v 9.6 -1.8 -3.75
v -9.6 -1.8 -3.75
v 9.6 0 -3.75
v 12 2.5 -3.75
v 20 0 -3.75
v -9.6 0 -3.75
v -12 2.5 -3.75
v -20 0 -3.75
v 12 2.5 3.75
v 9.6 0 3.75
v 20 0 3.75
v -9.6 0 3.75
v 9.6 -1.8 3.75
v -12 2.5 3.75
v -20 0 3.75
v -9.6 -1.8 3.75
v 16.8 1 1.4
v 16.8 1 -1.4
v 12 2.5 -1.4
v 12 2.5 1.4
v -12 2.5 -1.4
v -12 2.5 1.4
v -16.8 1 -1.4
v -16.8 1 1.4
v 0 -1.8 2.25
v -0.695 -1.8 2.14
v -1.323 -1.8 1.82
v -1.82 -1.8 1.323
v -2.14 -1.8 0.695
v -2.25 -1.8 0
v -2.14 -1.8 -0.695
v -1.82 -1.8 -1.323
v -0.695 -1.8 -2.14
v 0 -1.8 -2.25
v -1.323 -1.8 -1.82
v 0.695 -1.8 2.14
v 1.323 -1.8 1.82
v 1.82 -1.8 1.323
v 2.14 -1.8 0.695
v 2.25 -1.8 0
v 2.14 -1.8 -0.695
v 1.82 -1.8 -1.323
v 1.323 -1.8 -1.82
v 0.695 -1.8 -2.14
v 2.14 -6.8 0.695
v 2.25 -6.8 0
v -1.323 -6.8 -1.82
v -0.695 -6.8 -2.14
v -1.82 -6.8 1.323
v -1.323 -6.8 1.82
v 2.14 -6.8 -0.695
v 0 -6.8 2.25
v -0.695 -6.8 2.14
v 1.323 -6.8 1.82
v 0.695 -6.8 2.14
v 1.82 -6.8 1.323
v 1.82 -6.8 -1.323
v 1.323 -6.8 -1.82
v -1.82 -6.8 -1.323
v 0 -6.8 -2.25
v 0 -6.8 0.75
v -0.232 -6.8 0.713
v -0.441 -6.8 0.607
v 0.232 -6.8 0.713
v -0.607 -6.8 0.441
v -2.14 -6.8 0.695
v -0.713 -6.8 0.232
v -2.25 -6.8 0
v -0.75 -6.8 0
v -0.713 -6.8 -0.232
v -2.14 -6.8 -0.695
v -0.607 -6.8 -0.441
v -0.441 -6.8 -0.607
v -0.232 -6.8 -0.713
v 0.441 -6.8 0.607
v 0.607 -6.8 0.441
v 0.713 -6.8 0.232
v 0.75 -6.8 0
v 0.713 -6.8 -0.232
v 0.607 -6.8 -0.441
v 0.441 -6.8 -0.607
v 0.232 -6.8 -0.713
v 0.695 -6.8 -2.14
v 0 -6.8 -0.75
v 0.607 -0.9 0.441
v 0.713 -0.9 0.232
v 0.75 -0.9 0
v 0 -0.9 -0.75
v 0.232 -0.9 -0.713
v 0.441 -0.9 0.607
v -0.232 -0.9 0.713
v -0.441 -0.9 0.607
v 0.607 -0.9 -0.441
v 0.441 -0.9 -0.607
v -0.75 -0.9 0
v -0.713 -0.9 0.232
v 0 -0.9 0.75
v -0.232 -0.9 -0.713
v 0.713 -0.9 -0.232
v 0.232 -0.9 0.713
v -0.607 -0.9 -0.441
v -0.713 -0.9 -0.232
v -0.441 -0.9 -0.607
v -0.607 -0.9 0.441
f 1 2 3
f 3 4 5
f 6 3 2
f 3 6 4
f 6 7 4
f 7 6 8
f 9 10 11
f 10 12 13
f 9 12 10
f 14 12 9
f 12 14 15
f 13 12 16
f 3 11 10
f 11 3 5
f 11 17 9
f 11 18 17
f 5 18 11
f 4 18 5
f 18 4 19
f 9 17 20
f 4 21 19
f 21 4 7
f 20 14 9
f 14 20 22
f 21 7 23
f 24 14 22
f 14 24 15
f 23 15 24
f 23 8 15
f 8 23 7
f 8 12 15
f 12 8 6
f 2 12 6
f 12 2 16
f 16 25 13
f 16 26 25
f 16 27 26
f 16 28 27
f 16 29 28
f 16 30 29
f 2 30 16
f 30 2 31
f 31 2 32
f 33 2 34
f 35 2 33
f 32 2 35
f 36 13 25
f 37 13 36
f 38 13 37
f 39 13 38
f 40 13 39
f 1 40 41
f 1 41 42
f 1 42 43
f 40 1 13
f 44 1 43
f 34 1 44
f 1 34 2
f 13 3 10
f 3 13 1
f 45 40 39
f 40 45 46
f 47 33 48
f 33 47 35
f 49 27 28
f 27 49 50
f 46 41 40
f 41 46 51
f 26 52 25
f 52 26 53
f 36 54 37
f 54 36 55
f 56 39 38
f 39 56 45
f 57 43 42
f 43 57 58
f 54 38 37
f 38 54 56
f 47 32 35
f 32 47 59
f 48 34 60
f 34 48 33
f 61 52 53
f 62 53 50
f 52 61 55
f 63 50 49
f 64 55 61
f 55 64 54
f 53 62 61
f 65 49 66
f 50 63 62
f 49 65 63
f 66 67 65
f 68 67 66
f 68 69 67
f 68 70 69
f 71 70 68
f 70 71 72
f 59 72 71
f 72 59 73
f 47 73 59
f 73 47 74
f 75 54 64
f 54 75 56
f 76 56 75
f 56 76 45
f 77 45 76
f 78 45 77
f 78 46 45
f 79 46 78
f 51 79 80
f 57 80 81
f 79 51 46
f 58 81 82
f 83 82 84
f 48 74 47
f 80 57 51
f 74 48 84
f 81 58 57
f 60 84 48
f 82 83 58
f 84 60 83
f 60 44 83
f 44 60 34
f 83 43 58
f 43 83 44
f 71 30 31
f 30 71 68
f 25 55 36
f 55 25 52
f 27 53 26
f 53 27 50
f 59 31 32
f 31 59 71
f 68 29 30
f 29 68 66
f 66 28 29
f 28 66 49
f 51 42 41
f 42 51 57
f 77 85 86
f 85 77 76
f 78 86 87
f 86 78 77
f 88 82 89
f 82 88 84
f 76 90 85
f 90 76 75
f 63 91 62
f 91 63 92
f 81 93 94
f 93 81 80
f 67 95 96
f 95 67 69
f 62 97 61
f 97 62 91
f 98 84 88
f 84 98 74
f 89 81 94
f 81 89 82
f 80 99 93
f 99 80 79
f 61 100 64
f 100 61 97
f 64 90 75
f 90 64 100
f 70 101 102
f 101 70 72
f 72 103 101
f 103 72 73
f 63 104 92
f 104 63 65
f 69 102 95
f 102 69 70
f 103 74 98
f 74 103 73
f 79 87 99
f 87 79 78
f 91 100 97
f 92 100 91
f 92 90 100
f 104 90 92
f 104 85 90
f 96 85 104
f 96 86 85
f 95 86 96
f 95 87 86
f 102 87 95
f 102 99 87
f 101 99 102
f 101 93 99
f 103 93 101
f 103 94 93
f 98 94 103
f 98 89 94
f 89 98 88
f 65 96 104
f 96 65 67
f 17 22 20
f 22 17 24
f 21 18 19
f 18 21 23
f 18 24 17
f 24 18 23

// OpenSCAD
laenge = 40;
laenge1 = 24;
hoehe1 = 2.5;
laenge2 = 19.2; // or 12
hoehe2 = 1.8;
breite = 7.5;
zylinderd = 4.5;
zylinderl = 5;
schraube = 1.5;
rille = 2.8;
$fn=20;

points = [[laenge/2, 0], [laenge1/2, hoehe1], [-laenge1/2, hoehe1], [-laenge/2, 0], [-laenge2/2, 0],[-laenge2/2, -hoehe2], [laenge2/2, -hoehe2], [laenge2/2, 0]  ];

difference(){
    union(){
        linear_extrude(breite, center=true) polygon(points);
        rotate([90, 0, 0])
            cylinder(zylinderl + hoehe2, zylinderd/2, zylinderd/2, false);
    };
    translate([0, -hoehe2/2,0]) rotate([90, 0, 0])
        cylinder(zylinderl + hoehe2, schraube/2, schraube/2, false);
    translate([0, 2.5, 0]) cube([laenge, 3, rille], center=true);   
}
